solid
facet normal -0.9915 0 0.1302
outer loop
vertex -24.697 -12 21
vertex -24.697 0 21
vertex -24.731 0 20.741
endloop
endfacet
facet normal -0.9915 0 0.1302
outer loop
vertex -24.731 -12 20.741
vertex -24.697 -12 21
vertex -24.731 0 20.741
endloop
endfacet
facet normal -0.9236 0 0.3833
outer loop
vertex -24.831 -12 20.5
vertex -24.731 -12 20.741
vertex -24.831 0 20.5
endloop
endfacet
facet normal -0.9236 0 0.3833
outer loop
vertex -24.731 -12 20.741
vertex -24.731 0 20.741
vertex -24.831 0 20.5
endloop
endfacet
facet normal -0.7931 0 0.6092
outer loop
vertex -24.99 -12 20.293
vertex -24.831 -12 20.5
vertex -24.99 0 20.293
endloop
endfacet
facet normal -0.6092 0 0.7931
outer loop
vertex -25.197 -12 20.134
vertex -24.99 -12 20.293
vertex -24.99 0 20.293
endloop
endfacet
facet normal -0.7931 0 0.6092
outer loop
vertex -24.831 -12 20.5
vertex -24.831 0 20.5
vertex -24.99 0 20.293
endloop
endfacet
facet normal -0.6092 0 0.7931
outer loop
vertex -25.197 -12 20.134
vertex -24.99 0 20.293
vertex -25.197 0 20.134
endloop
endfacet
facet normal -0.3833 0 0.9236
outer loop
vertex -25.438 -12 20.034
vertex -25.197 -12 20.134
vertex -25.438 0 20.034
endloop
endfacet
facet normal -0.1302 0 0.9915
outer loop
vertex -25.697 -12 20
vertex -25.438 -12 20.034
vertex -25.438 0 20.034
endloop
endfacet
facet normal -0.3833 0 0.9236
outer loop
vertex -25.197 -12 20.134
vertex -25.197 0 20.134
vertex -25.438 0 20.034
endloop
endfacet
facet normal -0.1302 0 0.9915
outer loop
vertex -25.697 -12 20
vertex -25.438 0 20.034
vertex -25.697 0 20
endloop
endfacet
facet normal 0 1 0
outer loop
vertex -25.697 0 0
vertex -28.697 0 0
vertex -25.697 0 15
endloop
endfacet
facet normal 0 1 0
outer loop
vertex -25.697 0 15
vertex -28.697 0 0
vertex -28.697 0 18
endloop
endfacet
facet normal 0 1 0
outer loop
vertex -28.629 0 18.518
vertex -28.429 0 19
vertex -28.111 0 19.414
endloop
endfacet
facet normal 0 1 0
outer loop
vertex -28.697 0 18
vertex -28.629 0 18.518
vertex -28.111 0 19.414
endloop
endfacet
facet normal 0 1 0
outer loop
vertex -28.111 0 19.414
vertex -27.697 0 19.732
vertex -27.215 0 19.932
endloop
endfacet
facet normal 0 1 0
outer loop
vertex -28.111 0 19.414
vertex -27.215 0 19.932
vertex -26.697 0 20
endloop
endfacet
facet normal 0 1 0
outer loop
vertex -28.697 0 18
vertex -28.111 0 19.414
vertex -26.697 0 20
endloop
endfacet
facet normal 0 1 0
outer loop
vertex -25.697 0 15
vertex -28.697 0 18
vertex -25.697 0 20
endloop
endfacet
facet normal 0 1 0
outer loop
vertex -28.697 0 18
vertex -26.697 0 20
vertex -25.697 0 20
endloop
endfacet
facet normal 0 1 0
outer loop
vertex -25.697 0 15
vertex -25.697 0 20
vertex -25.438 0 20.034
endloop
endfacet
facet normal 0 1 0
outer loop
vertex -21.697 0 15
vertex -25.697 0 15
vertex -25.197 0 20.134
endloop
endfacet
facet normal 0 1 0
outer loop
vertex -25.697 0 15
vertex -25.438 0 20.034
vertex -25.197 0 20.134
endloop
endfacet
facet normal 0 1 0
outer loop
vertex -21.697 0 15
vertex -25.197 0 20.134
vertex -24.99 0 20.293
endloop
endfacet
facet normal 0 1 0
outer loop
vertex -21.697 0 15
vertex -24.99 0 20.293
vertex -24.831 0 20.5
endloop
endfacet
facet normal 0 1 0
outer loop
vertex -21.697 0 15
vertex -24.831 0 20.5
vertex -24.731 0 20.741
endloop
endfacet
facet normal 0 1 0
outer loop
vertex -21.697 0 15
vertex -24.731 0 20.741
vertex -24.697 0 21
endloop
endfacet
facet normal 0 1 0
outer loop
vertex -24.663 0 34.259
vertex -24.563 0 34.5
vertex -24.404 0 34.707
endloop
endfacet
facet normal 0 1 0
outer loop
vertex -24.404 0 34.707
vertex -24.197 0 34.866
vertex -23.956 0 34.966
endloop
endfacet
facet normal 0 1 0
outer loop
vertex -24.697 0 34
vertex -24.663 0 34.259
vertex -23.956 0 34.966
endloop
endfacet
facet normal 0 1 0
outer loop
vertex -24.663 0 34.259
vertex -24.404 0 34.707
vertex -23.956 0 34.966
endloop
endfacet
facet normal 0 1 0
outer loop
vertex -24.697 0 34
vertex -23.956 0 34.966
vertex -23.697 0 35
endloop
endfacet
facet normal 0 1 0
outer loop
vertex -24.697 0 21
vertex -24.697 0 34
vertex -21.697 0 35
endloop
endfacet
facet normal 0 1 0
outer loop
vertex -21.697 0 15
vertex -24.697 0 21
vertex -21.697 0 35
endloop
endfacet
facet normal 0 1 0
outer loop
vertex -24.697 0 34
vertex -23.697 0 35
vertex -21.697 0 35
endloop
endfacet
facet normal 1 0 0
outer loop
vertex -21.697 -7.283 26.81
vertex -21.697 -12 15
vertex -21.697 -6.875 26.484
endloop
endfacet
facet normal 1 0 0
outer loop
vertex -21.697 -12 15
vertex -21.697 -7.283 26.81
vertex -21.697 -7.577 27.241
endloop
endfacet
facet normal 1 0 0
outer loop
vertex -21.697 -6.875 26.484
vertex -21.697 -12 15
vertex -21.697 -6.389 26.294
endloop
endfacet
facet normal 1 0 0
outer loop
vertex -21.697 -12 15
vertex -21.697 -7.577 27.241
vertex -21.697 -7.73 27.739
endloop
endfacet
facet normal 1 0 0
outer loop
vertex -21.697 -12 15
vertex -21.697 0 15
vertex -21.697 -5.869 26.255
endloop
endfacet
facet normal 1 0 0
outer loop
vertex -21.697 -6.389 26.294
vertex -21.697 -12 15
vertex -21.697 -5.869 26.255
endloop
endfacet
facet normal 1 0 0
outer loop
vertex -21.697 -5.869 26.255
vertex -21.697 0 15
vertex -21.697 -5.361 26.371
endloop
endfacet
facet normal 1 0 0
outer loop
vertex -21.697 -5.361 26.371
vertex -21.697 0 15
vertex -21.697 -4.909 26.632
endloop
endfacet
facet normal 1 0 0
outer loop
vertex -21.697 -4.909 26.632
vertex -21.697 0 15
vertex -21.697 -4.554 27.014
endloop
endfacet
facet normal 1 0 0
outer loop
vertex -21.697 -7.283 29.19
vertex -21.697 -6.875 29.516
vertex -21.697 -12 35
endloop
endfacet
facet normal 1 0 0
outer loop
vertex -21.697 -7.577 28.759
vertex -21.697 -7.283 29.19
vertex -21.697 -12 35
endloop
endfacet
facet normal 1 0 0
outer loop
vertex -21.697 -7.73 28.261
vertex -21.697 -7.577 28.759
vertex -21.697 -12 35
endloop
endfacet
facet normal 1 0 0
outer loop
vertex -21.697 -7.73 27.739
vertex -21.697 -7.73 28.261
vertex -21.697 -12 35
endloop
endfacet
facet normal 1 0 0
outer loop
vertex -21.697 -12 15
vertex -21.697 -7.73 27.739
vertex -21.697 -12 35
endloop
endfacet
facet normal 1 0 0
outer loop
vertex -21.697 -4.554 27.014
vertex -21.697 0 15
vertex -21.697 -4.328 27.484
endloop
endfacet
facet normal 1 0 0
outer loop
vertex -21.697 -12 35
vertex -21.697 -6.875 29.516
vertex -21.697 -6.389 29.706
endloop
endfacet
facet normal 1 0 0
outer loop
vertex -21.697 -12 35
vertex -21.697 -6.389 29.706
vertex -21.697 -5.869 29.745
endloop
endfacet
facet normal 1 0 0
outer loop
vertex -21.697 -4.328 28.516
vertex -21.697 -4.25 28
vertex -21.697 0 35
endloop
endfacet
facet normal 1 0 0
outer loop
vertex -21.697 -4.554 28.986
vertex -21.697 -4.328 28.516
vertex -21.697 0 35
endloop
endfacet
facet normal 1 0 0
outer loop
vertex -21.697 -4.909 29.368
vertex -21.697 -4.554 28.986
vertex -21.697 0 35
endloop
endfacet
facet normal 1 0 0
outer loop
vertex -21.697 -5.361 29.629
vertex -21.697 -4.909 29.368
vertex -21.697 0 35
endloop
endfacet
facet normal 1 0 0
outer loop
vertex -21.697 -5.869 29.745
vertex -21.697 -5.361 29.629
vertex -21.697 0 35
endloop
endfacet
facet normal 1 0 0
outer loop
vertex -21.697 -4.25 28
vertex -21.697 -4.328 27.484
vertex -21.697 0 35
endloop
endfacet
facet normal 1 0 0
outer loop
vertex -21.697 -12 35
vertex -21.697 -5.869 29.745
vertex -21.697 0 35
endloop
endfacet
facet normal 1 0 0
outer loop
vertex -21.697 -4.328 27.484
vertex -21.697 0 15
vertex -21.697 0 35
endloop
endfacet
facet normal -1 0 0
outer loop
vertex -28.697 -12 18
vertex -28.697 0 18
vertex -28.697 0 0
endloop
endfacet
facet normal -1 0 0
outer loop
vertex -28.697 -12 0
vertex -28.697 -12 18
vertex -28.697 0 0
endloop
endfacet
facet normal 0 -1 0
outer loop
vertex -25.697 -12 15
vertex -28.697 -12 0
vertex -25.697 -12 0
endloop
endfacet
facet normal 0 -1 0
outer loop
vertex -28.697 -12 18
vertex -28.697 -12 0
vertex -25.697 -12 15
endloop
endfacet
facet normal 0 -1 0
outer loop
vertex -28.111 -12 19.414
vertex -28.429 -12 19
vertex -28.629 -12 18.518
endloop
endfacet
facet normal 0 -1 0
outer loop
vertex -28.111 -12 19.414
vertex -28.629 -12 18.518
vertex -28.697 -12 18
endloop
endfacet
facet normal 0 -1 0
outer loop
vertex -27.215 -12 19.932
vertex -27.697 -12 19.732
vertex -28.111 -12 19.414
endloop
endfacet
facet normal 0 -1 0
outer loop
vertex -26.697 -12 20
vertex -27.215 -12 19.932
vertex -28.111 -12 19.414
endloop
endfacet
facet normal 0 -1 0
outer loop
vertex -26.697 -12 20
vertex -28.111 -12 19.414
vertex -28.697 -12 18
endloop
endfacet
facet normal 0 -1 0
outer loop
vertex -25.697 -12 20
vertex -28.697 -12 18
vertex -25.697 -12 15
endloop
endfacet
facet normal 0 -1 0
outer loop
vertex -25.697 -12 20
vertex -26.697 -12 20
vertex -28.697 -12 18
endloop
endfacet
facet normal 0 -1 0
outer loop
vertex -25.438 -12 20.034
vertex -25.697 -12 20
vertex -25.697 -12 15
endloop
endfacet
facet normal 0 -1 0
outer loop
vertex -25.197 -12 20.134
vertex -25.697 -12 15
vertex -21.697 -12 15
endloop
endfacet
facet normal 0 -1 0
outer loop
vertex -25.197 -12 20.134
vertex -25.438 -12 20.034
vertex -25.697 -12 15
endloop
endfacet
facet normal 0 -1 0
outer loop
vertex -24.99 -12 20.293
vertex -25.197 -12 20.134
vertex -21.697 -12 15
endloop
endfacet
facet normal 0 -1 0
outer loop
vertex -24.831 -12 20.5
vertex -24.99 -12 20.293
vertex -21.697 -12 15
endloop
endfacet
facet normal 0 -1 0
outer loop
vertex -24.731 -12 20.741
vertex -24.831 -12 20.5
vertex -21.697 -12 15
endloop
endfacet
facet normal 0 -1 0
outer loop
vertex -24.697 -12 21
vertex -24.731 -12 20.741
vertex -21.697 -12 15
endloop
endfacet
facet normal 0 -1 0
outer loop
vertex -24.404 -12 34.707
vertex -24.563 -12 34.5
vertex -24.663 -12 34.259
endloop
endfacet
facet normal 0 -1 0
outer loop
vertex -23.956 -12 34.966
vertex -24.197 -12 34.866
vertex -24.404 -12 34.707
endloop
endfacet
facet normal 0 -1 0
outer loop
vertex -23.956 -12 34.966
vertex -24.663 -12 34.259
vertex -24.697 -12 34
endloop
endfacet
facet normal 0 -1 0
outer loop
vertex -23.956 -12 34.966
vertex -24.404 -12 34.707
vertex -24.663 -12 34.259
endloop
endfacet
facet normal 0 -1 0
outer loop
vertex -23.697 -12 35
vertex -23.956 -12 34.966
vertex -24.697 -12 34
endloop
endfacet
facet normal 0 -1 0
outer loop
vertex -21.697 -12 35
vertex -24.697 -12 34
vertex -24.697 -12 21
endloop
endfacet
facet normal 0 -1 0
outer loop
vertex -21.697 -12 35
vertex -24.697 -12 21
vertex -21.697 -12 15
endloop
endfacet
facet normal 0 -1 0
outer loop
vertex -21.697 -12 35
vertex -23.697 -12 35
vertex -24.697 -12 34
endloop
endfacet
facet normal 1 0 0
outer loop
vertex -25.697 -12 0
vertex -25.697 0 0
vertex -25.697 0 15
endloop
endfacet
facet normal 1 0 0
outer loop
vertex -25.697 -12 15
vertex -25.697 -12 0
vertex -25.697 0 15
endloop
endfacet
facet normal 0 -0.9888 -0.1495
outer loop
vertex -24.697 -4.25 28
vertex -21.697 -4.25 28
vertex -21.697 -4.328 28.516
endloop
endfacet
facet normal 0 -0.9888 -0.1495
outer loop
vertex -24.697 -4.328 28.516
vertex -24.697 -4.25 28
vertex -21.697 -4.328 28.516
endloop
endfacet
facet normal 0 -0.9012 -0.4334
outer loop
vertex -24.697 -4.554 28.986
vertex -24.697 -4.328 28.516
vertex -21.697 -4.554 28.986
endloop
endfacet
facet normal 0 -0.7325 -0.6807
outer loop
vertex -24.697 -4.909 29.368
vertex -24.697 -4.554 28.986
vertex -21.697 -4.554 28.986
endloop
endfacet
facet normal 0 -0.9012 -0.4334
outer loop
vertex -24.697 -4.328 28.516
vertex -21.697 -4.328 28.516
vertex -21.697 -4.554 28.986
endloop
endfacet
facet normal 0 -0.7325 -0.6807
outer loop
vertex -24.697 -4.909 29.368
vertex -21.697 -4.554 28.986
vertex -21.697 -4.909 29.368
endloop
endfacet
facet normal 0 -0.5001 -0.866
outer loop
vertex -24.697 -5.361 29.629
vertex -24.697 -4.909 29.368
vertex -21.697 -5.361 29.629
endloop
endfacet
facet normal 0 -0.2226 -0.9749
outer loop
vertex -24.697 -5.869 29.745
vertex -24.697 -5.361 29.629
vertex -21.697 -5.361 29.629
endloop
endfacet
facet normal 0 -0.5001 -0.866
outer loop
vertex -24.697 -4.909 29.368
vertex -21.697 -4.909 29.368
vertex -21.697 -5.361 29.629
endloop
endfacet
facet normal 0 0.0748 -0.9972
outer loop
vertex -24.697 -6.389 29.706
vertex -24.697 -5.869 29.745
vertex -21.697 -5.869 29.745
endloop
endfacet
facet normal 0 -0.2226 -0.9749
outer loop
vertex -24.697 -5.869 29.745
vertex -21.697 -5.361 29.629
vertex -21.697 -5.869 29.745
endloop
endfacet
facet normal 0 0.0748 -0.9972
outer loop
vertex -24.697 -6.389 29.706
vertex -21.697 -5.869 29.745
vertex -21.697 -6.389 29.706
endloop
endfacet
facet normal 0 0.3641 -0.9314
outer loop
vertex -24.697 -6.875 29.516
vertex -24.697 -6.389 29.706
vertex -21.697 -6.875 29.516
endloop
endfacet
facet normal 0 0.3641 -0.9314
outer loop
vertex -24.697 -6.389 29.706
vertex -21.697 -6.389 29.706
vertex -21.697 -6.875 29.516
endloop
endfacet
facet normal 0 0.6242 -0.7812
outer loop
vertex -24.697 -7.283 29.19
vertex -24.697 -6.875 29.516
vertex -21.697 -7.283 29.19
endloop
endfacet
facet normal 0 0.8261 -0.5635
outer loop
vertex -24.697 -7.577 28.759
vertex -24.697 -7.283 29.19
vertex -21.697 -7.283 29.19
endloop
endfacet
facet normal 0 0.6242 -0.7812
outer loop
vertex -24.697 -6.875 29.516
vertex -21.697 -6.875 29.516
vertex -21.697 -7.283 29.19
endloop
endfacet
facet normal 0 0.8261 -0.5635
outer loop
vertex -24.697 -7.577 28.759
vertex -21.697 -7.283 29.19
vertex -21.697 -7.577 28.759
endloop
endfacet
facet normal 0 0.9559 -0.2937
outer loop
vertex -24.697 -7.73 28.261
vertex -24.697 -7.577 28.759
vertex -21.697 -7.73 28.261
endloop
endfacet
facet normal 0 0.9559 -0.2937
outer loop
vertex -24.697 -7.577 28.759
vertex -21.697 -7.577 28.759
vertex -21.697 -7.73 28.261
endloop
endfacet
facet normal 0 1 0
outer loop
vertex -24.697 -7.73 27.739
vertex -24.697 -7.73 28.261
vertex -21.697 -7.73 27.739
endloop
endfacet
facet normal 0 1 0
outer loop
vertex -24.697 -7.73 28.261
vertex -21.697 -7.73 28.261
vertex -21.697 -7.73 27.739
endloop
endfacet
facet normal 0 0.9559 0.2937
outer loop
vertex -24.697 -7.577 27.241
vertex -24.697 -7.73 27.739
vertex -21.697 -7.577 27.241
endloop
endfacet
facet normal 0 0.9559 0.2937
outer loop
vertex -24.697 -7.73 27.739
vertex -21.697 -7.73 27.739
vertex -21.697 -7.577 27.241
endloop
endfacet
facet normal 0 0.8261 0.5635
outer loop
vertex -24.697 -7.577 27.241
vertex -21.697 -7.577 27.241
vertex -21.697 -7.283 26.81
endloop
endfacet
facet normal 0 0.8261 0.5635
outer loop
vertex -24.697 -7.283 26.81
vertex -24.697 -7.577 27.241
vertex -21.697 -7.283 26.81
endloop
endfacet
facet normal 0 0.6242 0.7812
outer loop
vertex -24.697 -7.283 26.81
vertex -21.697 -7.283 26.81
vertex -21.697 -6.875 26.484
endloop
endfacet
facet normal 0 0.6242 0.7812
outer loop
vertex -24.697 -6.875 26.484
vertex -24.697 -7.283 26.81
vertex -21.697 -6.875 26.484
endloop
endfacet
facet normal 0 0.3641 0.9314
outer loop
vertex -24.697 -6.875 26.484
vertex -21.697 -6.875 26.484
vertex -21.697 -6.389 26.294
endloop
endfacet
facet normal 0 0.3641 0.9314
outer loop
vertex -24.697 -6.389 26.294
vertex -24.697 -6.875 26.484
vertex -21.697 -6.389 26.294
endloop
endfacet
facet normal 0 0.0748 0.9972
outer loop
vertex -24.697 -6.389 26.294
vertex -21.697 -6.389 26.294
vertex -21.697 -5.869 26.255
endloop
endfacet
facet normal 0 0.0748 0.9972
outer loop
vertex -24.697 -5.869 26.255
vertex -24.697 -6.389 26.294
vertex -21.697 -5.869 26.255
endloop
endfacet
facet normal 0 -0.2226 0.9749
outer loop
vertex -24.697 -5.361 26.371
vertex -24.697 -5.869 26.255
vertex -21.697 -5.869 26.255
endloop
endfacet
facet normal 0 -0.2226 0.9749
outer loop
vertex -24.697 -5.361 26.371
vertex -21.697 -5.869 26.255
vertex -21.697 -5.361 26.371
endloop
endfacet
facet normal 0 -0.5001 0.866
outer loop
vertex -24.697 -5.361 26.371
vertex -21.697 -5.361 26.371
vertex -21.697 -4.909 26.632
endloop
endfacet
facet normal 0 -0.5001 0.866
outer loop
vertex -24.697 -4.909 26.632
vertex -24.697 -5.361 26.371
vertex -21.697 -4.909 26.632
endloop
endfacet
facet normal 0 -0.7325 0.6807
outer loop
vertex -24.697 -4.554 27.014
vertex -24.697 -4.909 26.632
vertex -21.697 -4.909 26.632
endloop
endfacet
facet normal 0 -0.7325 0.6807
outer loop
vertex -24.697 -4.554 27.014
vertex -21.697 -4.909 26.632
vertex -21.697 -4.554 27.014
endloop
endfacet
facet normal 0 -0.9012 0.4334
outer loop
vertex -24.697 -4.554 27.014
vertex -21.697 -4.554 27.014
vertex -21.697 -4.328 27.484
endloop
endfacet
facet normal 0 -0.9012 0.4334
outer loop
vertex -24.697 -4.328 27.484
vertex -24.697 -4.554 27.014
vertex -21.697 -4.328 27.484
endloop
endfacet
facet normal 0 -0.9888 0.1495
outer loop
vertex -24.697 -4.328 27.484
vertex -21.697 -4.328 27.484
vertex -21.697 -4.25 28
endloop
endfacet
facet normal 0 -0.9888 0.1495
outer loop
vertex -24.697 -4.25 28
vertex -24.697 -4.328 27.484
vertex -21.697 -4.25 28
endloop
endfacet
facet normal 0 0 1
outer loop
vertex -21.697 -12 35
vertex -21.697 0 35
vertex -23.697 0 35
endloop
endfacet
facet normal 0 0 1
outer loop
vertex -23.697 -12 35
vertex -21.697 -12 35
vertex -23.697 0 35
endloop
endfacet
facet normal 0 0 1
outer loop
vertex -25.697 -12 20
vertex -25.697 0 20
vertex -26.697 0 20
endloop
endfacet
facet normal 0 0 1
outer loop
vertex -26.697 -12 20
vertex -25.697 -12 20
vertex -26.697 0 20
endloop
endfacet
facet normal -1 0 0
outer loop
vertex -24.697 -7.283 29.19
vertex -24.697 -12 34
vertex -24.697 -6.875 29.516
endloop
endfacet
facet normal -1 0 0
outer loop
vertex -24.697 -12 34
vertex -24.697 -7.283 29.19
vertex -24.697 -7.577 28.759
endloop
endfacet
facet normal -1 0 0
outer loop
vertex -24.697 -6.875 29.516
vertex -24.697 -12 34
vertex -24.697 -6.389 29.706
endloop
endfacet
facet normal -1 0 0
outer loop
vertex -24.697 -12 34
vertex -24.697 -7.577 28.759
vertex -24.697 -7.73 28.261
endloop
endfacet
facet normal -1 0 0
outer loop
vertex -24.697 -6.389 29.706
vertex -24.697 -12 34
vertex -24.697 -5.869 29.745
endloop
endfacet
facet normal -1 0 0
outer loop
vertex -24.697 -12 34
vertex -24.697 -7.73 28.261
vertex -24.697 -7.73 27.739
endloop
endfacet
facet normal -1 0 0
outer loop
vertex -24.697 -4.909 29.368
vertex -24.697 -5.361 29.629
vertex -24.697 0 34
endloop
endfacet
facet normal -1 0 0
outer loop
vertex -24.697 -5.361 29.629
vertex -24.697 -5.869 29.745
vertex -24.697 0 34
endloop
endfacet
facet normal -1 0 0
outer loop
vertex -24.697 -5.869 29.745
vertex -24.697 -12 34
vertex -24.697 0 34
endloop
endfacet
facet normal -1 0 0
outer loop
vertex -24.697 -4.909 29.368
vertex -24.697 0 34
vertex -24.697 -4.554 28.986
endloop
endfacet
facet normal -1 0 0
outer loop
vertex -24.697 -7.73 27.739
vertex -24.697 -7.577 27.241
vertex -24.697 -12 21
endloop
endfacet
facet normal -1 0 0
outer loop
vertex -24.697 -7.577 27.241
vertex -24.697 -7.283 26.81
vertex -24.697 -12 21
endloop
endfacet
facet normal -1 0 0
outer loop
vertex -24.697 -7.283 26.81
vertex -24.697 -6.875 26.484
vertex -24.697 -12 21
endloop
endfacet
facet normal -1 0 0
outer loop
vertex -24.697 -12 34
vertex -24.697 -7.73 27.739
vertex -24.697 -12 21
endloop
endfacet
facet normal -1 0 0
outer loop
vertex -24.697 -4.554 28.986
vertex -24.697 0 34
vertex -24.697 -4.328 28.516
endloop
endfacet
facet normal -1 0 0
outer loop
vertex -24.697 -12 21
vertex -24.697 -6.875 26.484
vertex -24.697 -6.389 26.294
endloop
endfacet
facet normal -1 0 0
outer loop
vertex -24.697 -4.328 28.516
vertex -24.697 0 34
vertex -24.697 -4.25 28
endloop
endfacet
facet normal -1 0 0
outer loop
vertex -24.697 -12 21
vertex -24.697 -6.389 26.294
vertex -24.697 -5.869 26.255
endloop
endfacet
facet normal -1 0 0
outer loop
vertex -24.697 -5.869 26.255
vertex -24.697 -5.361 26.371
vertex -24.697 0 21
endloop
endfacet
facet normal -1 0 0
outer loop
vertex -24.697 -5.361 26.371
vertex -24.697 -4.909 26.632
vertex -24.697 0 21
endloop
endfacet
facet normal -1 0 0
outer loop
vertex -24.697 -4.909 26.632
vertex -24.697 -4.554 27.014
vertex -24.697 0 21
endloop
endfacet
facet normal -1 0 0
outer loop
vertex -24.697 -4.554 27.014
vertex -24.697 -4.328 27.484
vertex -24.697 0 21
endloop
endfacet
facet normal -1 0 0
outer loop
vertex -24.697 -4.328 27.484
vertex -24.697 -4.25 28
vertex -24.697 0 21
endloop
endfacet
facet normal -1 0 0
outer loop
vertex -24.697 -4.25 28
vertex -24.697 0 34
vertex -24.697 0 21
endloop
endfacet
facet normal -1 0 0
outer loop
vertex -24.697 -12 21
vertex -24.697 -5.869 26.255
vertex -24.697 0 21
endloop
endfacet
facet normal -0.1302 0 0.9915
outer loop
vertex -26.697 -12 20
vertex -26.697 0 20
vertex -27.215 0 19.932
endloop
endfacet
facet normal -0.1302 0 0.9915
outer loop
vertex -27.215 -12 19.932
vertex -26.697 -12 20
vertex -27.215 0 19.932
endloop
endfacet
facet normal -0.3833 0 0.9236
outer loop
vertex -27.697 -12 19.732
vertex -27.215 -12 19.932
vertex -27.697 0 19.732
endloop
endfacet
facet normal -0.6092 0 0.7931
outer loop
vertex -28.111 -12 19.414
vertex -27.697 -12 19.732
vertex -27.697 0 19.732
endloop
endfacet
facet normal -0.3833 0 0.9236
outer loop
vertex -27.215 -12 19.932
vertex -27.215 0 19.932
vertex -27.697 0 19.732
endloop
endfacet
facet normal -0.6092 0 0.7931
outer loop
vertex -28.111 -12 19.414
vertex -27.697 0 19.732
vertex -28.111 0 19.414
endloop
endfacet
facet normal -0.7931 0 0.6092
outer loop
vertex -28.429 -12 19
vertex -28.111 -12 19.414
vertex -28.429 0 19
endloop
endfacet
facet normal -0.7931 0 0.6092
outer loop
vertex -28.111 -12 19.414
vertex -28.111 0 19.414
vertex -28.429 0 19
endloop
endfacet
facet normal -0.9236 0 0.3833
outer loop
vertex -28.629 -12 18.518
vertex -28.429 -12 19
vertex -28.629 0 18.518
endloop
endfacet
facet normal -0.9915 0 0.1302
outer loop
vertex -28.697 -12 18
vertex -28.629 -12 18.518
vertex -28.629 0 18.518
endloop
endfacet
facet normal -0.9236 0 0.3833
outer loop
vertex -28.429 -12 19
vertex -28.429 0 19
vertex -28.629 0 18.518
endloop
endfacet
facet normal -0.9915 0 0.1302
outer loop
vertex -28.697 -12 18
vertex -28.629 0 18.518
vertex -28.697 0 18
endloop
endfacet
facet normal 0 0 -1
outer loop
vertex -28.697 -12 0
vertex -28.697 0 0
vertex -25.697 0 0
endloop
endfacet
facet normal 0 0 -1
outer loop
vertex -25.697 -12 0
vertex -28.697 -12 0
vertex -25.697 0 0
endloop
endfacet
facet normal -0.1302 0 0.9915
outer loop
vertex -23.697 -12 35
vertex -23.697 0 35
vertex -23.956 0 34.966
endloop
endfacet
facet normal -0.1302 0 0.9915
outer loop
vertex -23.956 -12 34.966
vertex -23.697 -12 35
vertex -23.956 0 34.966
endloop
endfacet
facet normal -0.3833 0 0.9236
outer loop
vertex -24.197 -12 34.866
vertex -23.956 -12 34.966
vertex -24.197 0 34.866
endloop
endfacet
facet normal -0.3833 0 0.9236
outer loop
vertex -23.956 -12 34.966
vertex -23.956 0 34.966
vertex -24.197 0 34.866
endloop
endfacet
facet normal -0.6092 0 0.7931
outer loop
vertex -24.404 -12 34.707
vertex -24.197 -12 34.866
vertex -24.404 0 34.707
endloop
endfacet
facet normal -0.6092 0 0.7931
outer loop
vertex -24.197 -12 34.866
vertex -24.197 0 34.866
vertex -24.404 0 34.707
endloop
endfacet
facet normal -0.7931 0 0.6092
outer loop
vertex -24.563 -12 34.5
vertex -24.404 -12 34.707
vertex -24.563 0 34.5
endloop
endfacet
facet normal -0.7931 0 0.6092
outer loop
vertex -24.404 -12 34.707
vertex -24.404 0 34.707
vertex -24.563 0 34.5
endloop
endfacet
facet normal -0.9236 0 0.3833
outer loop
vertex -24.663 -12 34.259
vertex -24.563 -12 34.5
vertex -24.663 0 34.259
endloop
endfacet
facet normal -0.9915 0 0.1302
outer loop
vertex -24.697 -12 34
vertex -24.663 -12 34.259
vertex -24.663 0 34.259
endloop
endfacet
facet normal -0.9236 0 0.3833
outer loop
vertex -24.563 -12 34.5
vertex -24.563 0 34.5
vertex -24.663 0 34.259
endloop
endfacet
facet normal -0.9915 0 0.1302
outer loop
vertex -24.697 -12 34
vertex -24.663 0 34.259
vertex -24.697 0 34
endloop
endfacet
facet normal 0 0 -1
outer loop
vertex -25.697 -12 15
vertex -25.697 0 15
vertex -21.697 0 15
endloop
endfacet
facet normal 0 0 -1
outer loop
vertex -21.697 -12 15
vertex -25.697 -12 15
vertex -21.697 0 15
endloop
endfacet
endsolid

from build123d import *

# Parameters (mm, degrees)
F1_DEPTH = 12
F2_R     = 1.75
F3_DEPTH = 7.001


with BuildPart() as f1:
    # F0 (on Front) → F1 (new body)
    with BuildSketch(Plane.XZ):
        with BuildLine():
            Line((-28.697127, 0), (-25.697127, 0))
            Line((-25.697127, 0), (-25.697127, 15))
            Line((-25.697127, 15), (-21.697127, 15))
            Line((-21.697127, 15), (-21.697127, 35))
            Line((-21.697127, 35), (-23.697127, 35))
            ThreePointArc((-23.697127, 35), (-24.404233, 34.707107), (-24.697127, 34))
            Line((-24.697127, 34), (-24.697127, 21))
            ThreePointArc((-24.697127, 21), (-24.99002, 20.292893), (-25.697127, 20))
            Line((-25.697127, 20), (-26.697127, 20))
            ThreePointArc((-26.697127, 20), (-28.11134, 19.414214), (-28.697127, 18))
            Line((-28.697127, 18), (-28.697127, 0))
        make_face()
    extrude(amount=F1_DEPTH)

    # F2 (on face) → F3 (cut, through all)
    with BuildSketch(Plane.YZ.offset(-21.697127)):
        with Locations((-6, 28)):
            Circle(F2_R)
    extrude(amount=-F3_DEPTH, mode=Mode.SUBTRACT)


solid = f1.part
